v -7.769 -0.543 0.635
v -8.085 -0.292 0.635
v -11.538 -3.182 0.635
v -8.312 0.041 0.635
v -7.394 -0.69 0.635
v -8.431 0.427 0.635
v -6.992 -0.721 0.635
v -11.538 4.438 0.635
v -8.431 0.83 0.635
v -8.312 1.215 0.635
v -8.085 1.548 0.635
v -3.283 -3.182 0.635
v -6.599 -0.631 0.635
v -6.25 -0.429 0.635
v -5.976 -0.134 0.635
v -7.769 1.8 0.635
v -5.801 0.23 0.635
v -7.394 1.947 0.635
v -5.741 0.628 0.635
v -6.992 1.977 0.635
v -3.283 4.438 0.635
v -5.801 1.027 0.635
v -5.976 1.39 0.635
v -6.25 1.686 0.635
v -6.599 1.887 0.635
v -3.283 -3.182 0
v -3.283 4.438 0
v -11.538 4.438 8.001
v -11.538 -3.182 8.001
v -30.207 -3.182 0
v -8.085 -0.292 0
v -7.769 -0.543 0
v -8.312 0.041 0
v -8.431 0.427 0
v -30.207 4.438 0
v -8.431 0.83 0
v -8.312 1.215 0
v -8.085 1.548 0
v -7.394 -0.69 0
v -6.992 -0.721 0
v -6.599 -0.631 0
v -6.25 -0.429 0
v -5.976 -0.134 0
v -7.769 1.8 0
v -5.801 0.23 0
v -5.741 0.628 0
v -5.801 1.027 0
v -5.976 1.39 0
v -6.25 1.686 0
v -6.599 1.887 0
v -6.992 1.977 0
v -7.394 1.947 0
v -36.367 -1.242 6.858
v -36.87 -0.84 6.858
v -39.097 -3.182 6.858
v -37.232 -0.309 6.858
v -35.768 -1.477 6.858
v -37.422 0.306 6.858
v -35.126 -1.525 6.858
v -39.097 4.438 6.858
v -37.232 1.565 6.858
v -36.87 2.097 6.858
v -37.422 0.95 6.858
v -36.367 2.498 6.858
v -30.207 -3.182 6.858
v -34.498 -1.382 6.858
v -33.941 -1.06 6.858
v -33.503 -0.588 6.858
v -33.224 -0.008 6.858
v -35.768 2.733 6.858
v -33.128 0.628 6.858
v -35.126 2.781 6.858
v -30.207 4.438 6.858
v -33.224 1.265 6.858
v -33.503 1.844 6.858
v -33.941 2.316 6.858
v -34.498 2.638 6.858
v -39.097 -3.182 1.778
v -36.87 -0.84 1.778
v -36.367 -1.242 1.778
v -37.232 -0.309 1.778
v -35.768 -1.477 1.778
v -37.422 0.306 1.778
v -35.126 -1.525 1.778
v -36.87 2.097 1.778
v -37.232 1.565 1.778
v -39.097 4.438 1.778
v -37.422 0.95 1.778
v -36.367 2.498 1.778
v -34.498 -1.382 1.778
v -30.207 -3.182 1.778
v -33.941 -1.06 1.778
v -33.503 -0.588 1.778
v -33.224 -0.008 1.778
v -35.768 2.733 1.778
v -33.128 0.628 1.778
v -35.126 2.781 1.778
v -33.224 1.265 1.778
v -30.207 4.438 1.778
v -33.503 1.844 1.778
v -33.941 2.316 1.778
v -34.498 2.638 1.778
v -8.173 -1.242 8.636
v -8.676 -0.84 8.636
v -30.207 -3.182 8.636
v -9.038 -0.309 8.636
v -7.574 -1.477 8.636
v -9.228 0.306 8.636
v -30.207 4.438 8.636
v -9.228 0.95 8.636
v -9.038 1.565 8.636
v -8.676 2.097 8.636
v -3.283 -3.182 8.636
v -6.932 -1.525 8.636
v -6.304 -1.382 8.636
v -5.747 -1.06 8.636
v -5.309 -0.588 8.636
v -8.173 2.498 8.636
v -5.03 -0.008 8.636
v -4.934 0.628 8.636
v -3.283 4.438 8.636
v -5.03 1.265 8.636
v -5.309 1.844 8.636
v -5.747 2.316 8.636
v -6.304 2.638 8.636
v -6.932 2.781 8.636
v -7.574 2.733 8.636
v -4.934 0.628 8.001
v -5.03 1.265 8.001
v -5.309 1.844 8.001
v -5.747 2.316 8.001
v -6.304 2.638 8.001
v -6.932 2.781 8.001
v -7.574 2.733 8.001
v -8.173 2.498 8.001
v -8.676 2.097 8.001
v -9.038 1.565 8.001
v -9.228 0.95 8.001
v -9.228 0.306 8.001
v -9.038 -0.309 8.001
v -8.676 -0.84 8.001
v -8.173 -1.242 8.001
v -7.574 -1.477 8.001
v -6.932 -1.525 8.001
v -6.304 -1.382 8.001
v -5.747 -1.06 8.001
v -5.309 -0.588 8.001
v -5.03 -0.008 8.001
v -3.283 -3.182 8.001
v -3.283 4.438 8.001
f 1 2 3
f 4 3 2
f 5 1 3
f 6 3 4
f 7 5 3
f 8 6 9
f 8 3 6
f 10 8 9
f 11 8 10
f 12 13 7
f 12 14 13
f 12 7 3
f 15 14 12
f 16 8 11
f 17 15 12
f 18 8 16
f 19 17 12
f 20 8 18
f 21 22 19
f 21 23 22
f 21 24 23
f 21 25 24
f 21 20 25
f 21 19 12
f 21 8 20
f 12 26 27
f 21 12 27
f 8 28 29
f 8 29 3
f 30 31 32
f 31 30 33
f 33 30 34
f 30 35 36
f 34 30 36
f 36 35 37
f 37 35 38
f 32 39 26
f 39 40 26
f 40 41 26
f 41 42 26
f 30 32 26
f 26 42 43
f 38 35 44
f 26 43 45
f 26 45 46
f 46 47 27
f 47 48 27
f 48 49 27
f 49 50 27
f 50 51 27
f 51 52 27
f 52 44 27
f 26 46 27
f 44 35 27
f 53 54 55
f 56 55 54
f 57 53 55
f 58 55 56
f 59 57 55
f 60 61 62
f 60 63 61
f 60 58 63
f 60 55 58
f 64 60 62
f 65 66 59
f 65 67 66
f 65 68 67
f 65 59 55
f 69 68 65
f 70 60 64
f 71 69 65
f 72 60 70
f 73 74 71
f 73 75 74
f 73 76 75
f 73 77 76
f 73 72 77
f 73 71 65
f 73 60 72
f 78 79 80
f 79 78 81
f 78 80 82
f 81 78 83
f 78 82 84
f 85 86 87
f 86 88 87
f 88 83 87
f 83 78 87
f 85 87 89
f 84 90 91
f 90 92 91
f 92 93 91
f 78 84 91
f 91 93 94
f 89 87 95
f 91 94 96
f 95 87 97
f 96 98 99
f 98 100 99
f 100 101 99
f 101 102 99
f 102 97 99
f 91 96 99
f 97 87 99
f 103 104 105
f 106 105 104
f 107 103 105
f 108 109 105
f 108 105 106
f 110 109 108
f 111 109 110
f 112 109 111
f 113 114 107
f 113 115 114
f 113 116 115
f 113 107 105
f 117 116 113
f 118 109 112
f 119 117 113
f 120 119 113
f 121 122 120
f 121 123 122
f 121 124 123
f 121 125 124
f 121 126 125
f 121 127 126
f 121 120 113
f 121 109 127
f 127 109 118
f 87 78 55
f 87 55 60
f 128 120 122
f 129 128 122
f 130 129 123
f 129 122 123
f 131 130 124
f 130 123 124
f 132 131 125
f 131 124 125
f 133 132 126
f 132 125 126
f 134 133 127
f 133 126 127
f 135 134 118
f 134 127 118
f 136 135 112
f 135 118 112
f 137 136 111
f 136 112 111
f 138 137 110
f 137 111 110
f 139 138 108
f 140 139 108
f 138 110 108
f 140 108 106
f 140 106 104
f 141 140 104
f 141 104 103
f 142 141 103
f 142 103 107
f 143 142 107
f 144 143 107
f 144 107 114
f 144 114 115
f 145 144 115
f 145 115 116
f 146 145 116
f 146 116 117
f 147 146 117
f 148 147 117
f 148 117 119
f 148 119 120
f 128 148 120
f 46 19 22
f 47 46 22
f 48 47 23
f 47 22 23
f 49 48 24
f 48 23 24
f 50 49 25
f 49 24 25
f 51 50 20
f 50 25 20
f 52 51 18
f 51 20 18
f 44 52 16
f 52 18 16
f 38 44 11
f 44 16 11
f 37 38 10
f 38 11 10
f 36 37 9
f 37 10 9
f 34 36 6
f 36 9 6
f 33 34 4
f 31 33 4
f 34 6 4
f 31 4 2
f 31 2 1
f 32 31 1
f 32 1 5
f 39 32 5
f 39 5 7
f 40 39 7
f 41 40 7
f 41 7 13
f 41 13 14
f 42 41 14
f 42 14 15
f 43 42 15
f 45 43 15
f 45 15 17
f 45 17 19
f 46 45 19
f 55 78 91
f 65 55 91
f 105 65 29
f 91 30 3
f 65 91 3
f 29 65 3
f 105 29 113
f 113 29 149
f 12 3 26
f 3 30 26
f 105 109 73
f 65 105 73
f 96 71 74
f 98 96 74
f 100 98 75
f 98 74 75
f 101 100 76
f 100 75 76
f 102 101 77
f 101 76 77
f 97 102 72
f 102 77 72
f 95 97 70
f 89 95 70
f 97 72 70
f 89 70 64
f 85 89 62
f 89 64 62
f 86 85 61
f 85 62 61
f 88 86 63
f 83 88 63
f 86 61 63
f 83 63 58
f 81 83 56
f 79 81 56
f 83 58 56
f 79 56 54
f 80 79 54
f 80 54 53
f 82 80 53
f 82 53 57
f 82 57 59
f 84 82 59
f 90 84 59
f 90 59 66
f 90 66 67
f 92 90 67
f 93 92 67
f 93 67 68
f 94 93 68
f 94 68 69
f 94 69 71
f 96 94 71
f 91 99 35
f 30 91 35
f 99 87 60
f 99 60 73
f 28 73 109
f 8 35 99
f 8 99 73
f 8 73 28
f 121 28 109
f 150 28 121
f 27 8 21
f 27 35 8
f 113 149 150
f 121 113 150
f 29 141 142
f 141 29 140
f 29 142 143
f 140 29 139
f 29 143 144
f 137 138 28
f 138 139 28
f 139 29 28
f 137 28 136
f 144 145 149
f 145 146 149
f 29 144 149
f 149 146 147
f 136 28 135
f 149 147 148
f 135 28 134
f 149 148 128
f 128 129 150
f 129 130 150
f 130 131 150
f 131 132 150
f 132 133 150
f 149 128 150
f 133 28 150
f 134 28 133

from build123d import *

# Parameters (mm, degrees)
SKETCH1_W                 = 35.814
SKETCH1_H                 = 7.62
BOSS_EXTRUDE1_DEPTH       = 8.636
SKETCH4_W                 = 8.89
SKETCH4_H                 = 1.778
CUT_EXTRUDE1_DEPTH        = 8.62
SKETCH6_W                 = 8.255
SKETCH6_H                 = 7.366
CUT_EXTRUDE2_DEPTH        = 8.62
SKETCH7_R                 = 2.159
CUT_EXTRUDE3_DEPTH        = 7.858
CUT_EXTRUDE4_REACH        = 10.636
SKETCH8_R                 = 2.159
F_6_32_TAPPED_HOLE1_D     = 2.7051
F_6_32_TAPPED_HOLE1_DEPTH = 0.635


with BuildPart() as part:
    # Sketch1 → Boss-Extrude1 (new body)
    with BuildSketch(Plane.XY):
        with Locations((-21.190085106, 0.628244681)):
            Rectangle(SKETCH1_W, SKETCH1_H)
    extrude(amount=BOSS_EXTRUDE1_DEPTH)

    # Sketch4 → Cut-Extrude1 (cut, through all)
    with BuildSketch(Plane(origin=(0, 4.438244681, 0), x_dir=(1, 0, 0), z_dir=(0, 1, 0))):
        with Locations((-34.652085106, -0.889)):
            Rectangle(SKETCH4_W, SKETCH4_H)
        with Locations((-34.652085106, -7.747)):
            Rectangle(SKETCH4_W, SKETCH4_H)
    extrude(amount=-CUT_EXTRUDE1_DEPTH, mode=Mode.SUBTRACT)

    # Sketch6 → Cut-Extrude2 (cut, through all)
    with BuildSketch(Plane(origin=(0, 4.438244681, 0), x_dir=(1, 0, 0), z_dir=(0, 1, 0))):
        with Locations((-7.410585106, -4.318)):
            Rectangle(SKETCH6_W, SKETCH6_H)
    extrude(amount=-CUT_EXTRUDE2_DEPTH, mode=Mode.SUBTRACT)

    # Sketch7 → Cut-Extrude3 (cut, through all)
    with BuildSketch(Plane.XY.offset(6.858)):
        with Locations((-35.287085106, 0.628244681)):
            Circle(SKETCH7_R)
    extrude(amount=-CUT_EXTRUDE3_DEPTH, mode=Mode.SUBTRACT)

    # Sketch8 → Cut-Extrude4 (cut, up to next)
    with BuildSketch(Plane.XY.offset(8.636), mode=Mode.PRIVATE) as cut_extrude4_sk1:
        with Locations((-7.093085106, 0.628244681)):
            Circle(SKETCH8_R)
    cut_extrude4_tool1 = extrude(cut_extrude4_sk1.sketch, amount=-CUT_EXTRUDE4_REACH, mode=Mode.PRIVATE) & part.part
    add(cut_extrude4_tool1.solids().sort_by_distance((-7.093085, 0.628245, 8.636))[0], mode=Mode.SUBTRACT)

    # #6-32 Tapped Hole1
    with Locations(Plane(origin=(0, 0, 0), x_dir=(-1, 0, 0), z_dir=(0, 0, -1))):
        with Locations((7.093085106, 0.628244681)):
            Hole(F_6_32_TAPPED_HOLE1_D / 2, depth=F_6_32_TAPPED_HOLE1_DEPTH)


solid = part.part
